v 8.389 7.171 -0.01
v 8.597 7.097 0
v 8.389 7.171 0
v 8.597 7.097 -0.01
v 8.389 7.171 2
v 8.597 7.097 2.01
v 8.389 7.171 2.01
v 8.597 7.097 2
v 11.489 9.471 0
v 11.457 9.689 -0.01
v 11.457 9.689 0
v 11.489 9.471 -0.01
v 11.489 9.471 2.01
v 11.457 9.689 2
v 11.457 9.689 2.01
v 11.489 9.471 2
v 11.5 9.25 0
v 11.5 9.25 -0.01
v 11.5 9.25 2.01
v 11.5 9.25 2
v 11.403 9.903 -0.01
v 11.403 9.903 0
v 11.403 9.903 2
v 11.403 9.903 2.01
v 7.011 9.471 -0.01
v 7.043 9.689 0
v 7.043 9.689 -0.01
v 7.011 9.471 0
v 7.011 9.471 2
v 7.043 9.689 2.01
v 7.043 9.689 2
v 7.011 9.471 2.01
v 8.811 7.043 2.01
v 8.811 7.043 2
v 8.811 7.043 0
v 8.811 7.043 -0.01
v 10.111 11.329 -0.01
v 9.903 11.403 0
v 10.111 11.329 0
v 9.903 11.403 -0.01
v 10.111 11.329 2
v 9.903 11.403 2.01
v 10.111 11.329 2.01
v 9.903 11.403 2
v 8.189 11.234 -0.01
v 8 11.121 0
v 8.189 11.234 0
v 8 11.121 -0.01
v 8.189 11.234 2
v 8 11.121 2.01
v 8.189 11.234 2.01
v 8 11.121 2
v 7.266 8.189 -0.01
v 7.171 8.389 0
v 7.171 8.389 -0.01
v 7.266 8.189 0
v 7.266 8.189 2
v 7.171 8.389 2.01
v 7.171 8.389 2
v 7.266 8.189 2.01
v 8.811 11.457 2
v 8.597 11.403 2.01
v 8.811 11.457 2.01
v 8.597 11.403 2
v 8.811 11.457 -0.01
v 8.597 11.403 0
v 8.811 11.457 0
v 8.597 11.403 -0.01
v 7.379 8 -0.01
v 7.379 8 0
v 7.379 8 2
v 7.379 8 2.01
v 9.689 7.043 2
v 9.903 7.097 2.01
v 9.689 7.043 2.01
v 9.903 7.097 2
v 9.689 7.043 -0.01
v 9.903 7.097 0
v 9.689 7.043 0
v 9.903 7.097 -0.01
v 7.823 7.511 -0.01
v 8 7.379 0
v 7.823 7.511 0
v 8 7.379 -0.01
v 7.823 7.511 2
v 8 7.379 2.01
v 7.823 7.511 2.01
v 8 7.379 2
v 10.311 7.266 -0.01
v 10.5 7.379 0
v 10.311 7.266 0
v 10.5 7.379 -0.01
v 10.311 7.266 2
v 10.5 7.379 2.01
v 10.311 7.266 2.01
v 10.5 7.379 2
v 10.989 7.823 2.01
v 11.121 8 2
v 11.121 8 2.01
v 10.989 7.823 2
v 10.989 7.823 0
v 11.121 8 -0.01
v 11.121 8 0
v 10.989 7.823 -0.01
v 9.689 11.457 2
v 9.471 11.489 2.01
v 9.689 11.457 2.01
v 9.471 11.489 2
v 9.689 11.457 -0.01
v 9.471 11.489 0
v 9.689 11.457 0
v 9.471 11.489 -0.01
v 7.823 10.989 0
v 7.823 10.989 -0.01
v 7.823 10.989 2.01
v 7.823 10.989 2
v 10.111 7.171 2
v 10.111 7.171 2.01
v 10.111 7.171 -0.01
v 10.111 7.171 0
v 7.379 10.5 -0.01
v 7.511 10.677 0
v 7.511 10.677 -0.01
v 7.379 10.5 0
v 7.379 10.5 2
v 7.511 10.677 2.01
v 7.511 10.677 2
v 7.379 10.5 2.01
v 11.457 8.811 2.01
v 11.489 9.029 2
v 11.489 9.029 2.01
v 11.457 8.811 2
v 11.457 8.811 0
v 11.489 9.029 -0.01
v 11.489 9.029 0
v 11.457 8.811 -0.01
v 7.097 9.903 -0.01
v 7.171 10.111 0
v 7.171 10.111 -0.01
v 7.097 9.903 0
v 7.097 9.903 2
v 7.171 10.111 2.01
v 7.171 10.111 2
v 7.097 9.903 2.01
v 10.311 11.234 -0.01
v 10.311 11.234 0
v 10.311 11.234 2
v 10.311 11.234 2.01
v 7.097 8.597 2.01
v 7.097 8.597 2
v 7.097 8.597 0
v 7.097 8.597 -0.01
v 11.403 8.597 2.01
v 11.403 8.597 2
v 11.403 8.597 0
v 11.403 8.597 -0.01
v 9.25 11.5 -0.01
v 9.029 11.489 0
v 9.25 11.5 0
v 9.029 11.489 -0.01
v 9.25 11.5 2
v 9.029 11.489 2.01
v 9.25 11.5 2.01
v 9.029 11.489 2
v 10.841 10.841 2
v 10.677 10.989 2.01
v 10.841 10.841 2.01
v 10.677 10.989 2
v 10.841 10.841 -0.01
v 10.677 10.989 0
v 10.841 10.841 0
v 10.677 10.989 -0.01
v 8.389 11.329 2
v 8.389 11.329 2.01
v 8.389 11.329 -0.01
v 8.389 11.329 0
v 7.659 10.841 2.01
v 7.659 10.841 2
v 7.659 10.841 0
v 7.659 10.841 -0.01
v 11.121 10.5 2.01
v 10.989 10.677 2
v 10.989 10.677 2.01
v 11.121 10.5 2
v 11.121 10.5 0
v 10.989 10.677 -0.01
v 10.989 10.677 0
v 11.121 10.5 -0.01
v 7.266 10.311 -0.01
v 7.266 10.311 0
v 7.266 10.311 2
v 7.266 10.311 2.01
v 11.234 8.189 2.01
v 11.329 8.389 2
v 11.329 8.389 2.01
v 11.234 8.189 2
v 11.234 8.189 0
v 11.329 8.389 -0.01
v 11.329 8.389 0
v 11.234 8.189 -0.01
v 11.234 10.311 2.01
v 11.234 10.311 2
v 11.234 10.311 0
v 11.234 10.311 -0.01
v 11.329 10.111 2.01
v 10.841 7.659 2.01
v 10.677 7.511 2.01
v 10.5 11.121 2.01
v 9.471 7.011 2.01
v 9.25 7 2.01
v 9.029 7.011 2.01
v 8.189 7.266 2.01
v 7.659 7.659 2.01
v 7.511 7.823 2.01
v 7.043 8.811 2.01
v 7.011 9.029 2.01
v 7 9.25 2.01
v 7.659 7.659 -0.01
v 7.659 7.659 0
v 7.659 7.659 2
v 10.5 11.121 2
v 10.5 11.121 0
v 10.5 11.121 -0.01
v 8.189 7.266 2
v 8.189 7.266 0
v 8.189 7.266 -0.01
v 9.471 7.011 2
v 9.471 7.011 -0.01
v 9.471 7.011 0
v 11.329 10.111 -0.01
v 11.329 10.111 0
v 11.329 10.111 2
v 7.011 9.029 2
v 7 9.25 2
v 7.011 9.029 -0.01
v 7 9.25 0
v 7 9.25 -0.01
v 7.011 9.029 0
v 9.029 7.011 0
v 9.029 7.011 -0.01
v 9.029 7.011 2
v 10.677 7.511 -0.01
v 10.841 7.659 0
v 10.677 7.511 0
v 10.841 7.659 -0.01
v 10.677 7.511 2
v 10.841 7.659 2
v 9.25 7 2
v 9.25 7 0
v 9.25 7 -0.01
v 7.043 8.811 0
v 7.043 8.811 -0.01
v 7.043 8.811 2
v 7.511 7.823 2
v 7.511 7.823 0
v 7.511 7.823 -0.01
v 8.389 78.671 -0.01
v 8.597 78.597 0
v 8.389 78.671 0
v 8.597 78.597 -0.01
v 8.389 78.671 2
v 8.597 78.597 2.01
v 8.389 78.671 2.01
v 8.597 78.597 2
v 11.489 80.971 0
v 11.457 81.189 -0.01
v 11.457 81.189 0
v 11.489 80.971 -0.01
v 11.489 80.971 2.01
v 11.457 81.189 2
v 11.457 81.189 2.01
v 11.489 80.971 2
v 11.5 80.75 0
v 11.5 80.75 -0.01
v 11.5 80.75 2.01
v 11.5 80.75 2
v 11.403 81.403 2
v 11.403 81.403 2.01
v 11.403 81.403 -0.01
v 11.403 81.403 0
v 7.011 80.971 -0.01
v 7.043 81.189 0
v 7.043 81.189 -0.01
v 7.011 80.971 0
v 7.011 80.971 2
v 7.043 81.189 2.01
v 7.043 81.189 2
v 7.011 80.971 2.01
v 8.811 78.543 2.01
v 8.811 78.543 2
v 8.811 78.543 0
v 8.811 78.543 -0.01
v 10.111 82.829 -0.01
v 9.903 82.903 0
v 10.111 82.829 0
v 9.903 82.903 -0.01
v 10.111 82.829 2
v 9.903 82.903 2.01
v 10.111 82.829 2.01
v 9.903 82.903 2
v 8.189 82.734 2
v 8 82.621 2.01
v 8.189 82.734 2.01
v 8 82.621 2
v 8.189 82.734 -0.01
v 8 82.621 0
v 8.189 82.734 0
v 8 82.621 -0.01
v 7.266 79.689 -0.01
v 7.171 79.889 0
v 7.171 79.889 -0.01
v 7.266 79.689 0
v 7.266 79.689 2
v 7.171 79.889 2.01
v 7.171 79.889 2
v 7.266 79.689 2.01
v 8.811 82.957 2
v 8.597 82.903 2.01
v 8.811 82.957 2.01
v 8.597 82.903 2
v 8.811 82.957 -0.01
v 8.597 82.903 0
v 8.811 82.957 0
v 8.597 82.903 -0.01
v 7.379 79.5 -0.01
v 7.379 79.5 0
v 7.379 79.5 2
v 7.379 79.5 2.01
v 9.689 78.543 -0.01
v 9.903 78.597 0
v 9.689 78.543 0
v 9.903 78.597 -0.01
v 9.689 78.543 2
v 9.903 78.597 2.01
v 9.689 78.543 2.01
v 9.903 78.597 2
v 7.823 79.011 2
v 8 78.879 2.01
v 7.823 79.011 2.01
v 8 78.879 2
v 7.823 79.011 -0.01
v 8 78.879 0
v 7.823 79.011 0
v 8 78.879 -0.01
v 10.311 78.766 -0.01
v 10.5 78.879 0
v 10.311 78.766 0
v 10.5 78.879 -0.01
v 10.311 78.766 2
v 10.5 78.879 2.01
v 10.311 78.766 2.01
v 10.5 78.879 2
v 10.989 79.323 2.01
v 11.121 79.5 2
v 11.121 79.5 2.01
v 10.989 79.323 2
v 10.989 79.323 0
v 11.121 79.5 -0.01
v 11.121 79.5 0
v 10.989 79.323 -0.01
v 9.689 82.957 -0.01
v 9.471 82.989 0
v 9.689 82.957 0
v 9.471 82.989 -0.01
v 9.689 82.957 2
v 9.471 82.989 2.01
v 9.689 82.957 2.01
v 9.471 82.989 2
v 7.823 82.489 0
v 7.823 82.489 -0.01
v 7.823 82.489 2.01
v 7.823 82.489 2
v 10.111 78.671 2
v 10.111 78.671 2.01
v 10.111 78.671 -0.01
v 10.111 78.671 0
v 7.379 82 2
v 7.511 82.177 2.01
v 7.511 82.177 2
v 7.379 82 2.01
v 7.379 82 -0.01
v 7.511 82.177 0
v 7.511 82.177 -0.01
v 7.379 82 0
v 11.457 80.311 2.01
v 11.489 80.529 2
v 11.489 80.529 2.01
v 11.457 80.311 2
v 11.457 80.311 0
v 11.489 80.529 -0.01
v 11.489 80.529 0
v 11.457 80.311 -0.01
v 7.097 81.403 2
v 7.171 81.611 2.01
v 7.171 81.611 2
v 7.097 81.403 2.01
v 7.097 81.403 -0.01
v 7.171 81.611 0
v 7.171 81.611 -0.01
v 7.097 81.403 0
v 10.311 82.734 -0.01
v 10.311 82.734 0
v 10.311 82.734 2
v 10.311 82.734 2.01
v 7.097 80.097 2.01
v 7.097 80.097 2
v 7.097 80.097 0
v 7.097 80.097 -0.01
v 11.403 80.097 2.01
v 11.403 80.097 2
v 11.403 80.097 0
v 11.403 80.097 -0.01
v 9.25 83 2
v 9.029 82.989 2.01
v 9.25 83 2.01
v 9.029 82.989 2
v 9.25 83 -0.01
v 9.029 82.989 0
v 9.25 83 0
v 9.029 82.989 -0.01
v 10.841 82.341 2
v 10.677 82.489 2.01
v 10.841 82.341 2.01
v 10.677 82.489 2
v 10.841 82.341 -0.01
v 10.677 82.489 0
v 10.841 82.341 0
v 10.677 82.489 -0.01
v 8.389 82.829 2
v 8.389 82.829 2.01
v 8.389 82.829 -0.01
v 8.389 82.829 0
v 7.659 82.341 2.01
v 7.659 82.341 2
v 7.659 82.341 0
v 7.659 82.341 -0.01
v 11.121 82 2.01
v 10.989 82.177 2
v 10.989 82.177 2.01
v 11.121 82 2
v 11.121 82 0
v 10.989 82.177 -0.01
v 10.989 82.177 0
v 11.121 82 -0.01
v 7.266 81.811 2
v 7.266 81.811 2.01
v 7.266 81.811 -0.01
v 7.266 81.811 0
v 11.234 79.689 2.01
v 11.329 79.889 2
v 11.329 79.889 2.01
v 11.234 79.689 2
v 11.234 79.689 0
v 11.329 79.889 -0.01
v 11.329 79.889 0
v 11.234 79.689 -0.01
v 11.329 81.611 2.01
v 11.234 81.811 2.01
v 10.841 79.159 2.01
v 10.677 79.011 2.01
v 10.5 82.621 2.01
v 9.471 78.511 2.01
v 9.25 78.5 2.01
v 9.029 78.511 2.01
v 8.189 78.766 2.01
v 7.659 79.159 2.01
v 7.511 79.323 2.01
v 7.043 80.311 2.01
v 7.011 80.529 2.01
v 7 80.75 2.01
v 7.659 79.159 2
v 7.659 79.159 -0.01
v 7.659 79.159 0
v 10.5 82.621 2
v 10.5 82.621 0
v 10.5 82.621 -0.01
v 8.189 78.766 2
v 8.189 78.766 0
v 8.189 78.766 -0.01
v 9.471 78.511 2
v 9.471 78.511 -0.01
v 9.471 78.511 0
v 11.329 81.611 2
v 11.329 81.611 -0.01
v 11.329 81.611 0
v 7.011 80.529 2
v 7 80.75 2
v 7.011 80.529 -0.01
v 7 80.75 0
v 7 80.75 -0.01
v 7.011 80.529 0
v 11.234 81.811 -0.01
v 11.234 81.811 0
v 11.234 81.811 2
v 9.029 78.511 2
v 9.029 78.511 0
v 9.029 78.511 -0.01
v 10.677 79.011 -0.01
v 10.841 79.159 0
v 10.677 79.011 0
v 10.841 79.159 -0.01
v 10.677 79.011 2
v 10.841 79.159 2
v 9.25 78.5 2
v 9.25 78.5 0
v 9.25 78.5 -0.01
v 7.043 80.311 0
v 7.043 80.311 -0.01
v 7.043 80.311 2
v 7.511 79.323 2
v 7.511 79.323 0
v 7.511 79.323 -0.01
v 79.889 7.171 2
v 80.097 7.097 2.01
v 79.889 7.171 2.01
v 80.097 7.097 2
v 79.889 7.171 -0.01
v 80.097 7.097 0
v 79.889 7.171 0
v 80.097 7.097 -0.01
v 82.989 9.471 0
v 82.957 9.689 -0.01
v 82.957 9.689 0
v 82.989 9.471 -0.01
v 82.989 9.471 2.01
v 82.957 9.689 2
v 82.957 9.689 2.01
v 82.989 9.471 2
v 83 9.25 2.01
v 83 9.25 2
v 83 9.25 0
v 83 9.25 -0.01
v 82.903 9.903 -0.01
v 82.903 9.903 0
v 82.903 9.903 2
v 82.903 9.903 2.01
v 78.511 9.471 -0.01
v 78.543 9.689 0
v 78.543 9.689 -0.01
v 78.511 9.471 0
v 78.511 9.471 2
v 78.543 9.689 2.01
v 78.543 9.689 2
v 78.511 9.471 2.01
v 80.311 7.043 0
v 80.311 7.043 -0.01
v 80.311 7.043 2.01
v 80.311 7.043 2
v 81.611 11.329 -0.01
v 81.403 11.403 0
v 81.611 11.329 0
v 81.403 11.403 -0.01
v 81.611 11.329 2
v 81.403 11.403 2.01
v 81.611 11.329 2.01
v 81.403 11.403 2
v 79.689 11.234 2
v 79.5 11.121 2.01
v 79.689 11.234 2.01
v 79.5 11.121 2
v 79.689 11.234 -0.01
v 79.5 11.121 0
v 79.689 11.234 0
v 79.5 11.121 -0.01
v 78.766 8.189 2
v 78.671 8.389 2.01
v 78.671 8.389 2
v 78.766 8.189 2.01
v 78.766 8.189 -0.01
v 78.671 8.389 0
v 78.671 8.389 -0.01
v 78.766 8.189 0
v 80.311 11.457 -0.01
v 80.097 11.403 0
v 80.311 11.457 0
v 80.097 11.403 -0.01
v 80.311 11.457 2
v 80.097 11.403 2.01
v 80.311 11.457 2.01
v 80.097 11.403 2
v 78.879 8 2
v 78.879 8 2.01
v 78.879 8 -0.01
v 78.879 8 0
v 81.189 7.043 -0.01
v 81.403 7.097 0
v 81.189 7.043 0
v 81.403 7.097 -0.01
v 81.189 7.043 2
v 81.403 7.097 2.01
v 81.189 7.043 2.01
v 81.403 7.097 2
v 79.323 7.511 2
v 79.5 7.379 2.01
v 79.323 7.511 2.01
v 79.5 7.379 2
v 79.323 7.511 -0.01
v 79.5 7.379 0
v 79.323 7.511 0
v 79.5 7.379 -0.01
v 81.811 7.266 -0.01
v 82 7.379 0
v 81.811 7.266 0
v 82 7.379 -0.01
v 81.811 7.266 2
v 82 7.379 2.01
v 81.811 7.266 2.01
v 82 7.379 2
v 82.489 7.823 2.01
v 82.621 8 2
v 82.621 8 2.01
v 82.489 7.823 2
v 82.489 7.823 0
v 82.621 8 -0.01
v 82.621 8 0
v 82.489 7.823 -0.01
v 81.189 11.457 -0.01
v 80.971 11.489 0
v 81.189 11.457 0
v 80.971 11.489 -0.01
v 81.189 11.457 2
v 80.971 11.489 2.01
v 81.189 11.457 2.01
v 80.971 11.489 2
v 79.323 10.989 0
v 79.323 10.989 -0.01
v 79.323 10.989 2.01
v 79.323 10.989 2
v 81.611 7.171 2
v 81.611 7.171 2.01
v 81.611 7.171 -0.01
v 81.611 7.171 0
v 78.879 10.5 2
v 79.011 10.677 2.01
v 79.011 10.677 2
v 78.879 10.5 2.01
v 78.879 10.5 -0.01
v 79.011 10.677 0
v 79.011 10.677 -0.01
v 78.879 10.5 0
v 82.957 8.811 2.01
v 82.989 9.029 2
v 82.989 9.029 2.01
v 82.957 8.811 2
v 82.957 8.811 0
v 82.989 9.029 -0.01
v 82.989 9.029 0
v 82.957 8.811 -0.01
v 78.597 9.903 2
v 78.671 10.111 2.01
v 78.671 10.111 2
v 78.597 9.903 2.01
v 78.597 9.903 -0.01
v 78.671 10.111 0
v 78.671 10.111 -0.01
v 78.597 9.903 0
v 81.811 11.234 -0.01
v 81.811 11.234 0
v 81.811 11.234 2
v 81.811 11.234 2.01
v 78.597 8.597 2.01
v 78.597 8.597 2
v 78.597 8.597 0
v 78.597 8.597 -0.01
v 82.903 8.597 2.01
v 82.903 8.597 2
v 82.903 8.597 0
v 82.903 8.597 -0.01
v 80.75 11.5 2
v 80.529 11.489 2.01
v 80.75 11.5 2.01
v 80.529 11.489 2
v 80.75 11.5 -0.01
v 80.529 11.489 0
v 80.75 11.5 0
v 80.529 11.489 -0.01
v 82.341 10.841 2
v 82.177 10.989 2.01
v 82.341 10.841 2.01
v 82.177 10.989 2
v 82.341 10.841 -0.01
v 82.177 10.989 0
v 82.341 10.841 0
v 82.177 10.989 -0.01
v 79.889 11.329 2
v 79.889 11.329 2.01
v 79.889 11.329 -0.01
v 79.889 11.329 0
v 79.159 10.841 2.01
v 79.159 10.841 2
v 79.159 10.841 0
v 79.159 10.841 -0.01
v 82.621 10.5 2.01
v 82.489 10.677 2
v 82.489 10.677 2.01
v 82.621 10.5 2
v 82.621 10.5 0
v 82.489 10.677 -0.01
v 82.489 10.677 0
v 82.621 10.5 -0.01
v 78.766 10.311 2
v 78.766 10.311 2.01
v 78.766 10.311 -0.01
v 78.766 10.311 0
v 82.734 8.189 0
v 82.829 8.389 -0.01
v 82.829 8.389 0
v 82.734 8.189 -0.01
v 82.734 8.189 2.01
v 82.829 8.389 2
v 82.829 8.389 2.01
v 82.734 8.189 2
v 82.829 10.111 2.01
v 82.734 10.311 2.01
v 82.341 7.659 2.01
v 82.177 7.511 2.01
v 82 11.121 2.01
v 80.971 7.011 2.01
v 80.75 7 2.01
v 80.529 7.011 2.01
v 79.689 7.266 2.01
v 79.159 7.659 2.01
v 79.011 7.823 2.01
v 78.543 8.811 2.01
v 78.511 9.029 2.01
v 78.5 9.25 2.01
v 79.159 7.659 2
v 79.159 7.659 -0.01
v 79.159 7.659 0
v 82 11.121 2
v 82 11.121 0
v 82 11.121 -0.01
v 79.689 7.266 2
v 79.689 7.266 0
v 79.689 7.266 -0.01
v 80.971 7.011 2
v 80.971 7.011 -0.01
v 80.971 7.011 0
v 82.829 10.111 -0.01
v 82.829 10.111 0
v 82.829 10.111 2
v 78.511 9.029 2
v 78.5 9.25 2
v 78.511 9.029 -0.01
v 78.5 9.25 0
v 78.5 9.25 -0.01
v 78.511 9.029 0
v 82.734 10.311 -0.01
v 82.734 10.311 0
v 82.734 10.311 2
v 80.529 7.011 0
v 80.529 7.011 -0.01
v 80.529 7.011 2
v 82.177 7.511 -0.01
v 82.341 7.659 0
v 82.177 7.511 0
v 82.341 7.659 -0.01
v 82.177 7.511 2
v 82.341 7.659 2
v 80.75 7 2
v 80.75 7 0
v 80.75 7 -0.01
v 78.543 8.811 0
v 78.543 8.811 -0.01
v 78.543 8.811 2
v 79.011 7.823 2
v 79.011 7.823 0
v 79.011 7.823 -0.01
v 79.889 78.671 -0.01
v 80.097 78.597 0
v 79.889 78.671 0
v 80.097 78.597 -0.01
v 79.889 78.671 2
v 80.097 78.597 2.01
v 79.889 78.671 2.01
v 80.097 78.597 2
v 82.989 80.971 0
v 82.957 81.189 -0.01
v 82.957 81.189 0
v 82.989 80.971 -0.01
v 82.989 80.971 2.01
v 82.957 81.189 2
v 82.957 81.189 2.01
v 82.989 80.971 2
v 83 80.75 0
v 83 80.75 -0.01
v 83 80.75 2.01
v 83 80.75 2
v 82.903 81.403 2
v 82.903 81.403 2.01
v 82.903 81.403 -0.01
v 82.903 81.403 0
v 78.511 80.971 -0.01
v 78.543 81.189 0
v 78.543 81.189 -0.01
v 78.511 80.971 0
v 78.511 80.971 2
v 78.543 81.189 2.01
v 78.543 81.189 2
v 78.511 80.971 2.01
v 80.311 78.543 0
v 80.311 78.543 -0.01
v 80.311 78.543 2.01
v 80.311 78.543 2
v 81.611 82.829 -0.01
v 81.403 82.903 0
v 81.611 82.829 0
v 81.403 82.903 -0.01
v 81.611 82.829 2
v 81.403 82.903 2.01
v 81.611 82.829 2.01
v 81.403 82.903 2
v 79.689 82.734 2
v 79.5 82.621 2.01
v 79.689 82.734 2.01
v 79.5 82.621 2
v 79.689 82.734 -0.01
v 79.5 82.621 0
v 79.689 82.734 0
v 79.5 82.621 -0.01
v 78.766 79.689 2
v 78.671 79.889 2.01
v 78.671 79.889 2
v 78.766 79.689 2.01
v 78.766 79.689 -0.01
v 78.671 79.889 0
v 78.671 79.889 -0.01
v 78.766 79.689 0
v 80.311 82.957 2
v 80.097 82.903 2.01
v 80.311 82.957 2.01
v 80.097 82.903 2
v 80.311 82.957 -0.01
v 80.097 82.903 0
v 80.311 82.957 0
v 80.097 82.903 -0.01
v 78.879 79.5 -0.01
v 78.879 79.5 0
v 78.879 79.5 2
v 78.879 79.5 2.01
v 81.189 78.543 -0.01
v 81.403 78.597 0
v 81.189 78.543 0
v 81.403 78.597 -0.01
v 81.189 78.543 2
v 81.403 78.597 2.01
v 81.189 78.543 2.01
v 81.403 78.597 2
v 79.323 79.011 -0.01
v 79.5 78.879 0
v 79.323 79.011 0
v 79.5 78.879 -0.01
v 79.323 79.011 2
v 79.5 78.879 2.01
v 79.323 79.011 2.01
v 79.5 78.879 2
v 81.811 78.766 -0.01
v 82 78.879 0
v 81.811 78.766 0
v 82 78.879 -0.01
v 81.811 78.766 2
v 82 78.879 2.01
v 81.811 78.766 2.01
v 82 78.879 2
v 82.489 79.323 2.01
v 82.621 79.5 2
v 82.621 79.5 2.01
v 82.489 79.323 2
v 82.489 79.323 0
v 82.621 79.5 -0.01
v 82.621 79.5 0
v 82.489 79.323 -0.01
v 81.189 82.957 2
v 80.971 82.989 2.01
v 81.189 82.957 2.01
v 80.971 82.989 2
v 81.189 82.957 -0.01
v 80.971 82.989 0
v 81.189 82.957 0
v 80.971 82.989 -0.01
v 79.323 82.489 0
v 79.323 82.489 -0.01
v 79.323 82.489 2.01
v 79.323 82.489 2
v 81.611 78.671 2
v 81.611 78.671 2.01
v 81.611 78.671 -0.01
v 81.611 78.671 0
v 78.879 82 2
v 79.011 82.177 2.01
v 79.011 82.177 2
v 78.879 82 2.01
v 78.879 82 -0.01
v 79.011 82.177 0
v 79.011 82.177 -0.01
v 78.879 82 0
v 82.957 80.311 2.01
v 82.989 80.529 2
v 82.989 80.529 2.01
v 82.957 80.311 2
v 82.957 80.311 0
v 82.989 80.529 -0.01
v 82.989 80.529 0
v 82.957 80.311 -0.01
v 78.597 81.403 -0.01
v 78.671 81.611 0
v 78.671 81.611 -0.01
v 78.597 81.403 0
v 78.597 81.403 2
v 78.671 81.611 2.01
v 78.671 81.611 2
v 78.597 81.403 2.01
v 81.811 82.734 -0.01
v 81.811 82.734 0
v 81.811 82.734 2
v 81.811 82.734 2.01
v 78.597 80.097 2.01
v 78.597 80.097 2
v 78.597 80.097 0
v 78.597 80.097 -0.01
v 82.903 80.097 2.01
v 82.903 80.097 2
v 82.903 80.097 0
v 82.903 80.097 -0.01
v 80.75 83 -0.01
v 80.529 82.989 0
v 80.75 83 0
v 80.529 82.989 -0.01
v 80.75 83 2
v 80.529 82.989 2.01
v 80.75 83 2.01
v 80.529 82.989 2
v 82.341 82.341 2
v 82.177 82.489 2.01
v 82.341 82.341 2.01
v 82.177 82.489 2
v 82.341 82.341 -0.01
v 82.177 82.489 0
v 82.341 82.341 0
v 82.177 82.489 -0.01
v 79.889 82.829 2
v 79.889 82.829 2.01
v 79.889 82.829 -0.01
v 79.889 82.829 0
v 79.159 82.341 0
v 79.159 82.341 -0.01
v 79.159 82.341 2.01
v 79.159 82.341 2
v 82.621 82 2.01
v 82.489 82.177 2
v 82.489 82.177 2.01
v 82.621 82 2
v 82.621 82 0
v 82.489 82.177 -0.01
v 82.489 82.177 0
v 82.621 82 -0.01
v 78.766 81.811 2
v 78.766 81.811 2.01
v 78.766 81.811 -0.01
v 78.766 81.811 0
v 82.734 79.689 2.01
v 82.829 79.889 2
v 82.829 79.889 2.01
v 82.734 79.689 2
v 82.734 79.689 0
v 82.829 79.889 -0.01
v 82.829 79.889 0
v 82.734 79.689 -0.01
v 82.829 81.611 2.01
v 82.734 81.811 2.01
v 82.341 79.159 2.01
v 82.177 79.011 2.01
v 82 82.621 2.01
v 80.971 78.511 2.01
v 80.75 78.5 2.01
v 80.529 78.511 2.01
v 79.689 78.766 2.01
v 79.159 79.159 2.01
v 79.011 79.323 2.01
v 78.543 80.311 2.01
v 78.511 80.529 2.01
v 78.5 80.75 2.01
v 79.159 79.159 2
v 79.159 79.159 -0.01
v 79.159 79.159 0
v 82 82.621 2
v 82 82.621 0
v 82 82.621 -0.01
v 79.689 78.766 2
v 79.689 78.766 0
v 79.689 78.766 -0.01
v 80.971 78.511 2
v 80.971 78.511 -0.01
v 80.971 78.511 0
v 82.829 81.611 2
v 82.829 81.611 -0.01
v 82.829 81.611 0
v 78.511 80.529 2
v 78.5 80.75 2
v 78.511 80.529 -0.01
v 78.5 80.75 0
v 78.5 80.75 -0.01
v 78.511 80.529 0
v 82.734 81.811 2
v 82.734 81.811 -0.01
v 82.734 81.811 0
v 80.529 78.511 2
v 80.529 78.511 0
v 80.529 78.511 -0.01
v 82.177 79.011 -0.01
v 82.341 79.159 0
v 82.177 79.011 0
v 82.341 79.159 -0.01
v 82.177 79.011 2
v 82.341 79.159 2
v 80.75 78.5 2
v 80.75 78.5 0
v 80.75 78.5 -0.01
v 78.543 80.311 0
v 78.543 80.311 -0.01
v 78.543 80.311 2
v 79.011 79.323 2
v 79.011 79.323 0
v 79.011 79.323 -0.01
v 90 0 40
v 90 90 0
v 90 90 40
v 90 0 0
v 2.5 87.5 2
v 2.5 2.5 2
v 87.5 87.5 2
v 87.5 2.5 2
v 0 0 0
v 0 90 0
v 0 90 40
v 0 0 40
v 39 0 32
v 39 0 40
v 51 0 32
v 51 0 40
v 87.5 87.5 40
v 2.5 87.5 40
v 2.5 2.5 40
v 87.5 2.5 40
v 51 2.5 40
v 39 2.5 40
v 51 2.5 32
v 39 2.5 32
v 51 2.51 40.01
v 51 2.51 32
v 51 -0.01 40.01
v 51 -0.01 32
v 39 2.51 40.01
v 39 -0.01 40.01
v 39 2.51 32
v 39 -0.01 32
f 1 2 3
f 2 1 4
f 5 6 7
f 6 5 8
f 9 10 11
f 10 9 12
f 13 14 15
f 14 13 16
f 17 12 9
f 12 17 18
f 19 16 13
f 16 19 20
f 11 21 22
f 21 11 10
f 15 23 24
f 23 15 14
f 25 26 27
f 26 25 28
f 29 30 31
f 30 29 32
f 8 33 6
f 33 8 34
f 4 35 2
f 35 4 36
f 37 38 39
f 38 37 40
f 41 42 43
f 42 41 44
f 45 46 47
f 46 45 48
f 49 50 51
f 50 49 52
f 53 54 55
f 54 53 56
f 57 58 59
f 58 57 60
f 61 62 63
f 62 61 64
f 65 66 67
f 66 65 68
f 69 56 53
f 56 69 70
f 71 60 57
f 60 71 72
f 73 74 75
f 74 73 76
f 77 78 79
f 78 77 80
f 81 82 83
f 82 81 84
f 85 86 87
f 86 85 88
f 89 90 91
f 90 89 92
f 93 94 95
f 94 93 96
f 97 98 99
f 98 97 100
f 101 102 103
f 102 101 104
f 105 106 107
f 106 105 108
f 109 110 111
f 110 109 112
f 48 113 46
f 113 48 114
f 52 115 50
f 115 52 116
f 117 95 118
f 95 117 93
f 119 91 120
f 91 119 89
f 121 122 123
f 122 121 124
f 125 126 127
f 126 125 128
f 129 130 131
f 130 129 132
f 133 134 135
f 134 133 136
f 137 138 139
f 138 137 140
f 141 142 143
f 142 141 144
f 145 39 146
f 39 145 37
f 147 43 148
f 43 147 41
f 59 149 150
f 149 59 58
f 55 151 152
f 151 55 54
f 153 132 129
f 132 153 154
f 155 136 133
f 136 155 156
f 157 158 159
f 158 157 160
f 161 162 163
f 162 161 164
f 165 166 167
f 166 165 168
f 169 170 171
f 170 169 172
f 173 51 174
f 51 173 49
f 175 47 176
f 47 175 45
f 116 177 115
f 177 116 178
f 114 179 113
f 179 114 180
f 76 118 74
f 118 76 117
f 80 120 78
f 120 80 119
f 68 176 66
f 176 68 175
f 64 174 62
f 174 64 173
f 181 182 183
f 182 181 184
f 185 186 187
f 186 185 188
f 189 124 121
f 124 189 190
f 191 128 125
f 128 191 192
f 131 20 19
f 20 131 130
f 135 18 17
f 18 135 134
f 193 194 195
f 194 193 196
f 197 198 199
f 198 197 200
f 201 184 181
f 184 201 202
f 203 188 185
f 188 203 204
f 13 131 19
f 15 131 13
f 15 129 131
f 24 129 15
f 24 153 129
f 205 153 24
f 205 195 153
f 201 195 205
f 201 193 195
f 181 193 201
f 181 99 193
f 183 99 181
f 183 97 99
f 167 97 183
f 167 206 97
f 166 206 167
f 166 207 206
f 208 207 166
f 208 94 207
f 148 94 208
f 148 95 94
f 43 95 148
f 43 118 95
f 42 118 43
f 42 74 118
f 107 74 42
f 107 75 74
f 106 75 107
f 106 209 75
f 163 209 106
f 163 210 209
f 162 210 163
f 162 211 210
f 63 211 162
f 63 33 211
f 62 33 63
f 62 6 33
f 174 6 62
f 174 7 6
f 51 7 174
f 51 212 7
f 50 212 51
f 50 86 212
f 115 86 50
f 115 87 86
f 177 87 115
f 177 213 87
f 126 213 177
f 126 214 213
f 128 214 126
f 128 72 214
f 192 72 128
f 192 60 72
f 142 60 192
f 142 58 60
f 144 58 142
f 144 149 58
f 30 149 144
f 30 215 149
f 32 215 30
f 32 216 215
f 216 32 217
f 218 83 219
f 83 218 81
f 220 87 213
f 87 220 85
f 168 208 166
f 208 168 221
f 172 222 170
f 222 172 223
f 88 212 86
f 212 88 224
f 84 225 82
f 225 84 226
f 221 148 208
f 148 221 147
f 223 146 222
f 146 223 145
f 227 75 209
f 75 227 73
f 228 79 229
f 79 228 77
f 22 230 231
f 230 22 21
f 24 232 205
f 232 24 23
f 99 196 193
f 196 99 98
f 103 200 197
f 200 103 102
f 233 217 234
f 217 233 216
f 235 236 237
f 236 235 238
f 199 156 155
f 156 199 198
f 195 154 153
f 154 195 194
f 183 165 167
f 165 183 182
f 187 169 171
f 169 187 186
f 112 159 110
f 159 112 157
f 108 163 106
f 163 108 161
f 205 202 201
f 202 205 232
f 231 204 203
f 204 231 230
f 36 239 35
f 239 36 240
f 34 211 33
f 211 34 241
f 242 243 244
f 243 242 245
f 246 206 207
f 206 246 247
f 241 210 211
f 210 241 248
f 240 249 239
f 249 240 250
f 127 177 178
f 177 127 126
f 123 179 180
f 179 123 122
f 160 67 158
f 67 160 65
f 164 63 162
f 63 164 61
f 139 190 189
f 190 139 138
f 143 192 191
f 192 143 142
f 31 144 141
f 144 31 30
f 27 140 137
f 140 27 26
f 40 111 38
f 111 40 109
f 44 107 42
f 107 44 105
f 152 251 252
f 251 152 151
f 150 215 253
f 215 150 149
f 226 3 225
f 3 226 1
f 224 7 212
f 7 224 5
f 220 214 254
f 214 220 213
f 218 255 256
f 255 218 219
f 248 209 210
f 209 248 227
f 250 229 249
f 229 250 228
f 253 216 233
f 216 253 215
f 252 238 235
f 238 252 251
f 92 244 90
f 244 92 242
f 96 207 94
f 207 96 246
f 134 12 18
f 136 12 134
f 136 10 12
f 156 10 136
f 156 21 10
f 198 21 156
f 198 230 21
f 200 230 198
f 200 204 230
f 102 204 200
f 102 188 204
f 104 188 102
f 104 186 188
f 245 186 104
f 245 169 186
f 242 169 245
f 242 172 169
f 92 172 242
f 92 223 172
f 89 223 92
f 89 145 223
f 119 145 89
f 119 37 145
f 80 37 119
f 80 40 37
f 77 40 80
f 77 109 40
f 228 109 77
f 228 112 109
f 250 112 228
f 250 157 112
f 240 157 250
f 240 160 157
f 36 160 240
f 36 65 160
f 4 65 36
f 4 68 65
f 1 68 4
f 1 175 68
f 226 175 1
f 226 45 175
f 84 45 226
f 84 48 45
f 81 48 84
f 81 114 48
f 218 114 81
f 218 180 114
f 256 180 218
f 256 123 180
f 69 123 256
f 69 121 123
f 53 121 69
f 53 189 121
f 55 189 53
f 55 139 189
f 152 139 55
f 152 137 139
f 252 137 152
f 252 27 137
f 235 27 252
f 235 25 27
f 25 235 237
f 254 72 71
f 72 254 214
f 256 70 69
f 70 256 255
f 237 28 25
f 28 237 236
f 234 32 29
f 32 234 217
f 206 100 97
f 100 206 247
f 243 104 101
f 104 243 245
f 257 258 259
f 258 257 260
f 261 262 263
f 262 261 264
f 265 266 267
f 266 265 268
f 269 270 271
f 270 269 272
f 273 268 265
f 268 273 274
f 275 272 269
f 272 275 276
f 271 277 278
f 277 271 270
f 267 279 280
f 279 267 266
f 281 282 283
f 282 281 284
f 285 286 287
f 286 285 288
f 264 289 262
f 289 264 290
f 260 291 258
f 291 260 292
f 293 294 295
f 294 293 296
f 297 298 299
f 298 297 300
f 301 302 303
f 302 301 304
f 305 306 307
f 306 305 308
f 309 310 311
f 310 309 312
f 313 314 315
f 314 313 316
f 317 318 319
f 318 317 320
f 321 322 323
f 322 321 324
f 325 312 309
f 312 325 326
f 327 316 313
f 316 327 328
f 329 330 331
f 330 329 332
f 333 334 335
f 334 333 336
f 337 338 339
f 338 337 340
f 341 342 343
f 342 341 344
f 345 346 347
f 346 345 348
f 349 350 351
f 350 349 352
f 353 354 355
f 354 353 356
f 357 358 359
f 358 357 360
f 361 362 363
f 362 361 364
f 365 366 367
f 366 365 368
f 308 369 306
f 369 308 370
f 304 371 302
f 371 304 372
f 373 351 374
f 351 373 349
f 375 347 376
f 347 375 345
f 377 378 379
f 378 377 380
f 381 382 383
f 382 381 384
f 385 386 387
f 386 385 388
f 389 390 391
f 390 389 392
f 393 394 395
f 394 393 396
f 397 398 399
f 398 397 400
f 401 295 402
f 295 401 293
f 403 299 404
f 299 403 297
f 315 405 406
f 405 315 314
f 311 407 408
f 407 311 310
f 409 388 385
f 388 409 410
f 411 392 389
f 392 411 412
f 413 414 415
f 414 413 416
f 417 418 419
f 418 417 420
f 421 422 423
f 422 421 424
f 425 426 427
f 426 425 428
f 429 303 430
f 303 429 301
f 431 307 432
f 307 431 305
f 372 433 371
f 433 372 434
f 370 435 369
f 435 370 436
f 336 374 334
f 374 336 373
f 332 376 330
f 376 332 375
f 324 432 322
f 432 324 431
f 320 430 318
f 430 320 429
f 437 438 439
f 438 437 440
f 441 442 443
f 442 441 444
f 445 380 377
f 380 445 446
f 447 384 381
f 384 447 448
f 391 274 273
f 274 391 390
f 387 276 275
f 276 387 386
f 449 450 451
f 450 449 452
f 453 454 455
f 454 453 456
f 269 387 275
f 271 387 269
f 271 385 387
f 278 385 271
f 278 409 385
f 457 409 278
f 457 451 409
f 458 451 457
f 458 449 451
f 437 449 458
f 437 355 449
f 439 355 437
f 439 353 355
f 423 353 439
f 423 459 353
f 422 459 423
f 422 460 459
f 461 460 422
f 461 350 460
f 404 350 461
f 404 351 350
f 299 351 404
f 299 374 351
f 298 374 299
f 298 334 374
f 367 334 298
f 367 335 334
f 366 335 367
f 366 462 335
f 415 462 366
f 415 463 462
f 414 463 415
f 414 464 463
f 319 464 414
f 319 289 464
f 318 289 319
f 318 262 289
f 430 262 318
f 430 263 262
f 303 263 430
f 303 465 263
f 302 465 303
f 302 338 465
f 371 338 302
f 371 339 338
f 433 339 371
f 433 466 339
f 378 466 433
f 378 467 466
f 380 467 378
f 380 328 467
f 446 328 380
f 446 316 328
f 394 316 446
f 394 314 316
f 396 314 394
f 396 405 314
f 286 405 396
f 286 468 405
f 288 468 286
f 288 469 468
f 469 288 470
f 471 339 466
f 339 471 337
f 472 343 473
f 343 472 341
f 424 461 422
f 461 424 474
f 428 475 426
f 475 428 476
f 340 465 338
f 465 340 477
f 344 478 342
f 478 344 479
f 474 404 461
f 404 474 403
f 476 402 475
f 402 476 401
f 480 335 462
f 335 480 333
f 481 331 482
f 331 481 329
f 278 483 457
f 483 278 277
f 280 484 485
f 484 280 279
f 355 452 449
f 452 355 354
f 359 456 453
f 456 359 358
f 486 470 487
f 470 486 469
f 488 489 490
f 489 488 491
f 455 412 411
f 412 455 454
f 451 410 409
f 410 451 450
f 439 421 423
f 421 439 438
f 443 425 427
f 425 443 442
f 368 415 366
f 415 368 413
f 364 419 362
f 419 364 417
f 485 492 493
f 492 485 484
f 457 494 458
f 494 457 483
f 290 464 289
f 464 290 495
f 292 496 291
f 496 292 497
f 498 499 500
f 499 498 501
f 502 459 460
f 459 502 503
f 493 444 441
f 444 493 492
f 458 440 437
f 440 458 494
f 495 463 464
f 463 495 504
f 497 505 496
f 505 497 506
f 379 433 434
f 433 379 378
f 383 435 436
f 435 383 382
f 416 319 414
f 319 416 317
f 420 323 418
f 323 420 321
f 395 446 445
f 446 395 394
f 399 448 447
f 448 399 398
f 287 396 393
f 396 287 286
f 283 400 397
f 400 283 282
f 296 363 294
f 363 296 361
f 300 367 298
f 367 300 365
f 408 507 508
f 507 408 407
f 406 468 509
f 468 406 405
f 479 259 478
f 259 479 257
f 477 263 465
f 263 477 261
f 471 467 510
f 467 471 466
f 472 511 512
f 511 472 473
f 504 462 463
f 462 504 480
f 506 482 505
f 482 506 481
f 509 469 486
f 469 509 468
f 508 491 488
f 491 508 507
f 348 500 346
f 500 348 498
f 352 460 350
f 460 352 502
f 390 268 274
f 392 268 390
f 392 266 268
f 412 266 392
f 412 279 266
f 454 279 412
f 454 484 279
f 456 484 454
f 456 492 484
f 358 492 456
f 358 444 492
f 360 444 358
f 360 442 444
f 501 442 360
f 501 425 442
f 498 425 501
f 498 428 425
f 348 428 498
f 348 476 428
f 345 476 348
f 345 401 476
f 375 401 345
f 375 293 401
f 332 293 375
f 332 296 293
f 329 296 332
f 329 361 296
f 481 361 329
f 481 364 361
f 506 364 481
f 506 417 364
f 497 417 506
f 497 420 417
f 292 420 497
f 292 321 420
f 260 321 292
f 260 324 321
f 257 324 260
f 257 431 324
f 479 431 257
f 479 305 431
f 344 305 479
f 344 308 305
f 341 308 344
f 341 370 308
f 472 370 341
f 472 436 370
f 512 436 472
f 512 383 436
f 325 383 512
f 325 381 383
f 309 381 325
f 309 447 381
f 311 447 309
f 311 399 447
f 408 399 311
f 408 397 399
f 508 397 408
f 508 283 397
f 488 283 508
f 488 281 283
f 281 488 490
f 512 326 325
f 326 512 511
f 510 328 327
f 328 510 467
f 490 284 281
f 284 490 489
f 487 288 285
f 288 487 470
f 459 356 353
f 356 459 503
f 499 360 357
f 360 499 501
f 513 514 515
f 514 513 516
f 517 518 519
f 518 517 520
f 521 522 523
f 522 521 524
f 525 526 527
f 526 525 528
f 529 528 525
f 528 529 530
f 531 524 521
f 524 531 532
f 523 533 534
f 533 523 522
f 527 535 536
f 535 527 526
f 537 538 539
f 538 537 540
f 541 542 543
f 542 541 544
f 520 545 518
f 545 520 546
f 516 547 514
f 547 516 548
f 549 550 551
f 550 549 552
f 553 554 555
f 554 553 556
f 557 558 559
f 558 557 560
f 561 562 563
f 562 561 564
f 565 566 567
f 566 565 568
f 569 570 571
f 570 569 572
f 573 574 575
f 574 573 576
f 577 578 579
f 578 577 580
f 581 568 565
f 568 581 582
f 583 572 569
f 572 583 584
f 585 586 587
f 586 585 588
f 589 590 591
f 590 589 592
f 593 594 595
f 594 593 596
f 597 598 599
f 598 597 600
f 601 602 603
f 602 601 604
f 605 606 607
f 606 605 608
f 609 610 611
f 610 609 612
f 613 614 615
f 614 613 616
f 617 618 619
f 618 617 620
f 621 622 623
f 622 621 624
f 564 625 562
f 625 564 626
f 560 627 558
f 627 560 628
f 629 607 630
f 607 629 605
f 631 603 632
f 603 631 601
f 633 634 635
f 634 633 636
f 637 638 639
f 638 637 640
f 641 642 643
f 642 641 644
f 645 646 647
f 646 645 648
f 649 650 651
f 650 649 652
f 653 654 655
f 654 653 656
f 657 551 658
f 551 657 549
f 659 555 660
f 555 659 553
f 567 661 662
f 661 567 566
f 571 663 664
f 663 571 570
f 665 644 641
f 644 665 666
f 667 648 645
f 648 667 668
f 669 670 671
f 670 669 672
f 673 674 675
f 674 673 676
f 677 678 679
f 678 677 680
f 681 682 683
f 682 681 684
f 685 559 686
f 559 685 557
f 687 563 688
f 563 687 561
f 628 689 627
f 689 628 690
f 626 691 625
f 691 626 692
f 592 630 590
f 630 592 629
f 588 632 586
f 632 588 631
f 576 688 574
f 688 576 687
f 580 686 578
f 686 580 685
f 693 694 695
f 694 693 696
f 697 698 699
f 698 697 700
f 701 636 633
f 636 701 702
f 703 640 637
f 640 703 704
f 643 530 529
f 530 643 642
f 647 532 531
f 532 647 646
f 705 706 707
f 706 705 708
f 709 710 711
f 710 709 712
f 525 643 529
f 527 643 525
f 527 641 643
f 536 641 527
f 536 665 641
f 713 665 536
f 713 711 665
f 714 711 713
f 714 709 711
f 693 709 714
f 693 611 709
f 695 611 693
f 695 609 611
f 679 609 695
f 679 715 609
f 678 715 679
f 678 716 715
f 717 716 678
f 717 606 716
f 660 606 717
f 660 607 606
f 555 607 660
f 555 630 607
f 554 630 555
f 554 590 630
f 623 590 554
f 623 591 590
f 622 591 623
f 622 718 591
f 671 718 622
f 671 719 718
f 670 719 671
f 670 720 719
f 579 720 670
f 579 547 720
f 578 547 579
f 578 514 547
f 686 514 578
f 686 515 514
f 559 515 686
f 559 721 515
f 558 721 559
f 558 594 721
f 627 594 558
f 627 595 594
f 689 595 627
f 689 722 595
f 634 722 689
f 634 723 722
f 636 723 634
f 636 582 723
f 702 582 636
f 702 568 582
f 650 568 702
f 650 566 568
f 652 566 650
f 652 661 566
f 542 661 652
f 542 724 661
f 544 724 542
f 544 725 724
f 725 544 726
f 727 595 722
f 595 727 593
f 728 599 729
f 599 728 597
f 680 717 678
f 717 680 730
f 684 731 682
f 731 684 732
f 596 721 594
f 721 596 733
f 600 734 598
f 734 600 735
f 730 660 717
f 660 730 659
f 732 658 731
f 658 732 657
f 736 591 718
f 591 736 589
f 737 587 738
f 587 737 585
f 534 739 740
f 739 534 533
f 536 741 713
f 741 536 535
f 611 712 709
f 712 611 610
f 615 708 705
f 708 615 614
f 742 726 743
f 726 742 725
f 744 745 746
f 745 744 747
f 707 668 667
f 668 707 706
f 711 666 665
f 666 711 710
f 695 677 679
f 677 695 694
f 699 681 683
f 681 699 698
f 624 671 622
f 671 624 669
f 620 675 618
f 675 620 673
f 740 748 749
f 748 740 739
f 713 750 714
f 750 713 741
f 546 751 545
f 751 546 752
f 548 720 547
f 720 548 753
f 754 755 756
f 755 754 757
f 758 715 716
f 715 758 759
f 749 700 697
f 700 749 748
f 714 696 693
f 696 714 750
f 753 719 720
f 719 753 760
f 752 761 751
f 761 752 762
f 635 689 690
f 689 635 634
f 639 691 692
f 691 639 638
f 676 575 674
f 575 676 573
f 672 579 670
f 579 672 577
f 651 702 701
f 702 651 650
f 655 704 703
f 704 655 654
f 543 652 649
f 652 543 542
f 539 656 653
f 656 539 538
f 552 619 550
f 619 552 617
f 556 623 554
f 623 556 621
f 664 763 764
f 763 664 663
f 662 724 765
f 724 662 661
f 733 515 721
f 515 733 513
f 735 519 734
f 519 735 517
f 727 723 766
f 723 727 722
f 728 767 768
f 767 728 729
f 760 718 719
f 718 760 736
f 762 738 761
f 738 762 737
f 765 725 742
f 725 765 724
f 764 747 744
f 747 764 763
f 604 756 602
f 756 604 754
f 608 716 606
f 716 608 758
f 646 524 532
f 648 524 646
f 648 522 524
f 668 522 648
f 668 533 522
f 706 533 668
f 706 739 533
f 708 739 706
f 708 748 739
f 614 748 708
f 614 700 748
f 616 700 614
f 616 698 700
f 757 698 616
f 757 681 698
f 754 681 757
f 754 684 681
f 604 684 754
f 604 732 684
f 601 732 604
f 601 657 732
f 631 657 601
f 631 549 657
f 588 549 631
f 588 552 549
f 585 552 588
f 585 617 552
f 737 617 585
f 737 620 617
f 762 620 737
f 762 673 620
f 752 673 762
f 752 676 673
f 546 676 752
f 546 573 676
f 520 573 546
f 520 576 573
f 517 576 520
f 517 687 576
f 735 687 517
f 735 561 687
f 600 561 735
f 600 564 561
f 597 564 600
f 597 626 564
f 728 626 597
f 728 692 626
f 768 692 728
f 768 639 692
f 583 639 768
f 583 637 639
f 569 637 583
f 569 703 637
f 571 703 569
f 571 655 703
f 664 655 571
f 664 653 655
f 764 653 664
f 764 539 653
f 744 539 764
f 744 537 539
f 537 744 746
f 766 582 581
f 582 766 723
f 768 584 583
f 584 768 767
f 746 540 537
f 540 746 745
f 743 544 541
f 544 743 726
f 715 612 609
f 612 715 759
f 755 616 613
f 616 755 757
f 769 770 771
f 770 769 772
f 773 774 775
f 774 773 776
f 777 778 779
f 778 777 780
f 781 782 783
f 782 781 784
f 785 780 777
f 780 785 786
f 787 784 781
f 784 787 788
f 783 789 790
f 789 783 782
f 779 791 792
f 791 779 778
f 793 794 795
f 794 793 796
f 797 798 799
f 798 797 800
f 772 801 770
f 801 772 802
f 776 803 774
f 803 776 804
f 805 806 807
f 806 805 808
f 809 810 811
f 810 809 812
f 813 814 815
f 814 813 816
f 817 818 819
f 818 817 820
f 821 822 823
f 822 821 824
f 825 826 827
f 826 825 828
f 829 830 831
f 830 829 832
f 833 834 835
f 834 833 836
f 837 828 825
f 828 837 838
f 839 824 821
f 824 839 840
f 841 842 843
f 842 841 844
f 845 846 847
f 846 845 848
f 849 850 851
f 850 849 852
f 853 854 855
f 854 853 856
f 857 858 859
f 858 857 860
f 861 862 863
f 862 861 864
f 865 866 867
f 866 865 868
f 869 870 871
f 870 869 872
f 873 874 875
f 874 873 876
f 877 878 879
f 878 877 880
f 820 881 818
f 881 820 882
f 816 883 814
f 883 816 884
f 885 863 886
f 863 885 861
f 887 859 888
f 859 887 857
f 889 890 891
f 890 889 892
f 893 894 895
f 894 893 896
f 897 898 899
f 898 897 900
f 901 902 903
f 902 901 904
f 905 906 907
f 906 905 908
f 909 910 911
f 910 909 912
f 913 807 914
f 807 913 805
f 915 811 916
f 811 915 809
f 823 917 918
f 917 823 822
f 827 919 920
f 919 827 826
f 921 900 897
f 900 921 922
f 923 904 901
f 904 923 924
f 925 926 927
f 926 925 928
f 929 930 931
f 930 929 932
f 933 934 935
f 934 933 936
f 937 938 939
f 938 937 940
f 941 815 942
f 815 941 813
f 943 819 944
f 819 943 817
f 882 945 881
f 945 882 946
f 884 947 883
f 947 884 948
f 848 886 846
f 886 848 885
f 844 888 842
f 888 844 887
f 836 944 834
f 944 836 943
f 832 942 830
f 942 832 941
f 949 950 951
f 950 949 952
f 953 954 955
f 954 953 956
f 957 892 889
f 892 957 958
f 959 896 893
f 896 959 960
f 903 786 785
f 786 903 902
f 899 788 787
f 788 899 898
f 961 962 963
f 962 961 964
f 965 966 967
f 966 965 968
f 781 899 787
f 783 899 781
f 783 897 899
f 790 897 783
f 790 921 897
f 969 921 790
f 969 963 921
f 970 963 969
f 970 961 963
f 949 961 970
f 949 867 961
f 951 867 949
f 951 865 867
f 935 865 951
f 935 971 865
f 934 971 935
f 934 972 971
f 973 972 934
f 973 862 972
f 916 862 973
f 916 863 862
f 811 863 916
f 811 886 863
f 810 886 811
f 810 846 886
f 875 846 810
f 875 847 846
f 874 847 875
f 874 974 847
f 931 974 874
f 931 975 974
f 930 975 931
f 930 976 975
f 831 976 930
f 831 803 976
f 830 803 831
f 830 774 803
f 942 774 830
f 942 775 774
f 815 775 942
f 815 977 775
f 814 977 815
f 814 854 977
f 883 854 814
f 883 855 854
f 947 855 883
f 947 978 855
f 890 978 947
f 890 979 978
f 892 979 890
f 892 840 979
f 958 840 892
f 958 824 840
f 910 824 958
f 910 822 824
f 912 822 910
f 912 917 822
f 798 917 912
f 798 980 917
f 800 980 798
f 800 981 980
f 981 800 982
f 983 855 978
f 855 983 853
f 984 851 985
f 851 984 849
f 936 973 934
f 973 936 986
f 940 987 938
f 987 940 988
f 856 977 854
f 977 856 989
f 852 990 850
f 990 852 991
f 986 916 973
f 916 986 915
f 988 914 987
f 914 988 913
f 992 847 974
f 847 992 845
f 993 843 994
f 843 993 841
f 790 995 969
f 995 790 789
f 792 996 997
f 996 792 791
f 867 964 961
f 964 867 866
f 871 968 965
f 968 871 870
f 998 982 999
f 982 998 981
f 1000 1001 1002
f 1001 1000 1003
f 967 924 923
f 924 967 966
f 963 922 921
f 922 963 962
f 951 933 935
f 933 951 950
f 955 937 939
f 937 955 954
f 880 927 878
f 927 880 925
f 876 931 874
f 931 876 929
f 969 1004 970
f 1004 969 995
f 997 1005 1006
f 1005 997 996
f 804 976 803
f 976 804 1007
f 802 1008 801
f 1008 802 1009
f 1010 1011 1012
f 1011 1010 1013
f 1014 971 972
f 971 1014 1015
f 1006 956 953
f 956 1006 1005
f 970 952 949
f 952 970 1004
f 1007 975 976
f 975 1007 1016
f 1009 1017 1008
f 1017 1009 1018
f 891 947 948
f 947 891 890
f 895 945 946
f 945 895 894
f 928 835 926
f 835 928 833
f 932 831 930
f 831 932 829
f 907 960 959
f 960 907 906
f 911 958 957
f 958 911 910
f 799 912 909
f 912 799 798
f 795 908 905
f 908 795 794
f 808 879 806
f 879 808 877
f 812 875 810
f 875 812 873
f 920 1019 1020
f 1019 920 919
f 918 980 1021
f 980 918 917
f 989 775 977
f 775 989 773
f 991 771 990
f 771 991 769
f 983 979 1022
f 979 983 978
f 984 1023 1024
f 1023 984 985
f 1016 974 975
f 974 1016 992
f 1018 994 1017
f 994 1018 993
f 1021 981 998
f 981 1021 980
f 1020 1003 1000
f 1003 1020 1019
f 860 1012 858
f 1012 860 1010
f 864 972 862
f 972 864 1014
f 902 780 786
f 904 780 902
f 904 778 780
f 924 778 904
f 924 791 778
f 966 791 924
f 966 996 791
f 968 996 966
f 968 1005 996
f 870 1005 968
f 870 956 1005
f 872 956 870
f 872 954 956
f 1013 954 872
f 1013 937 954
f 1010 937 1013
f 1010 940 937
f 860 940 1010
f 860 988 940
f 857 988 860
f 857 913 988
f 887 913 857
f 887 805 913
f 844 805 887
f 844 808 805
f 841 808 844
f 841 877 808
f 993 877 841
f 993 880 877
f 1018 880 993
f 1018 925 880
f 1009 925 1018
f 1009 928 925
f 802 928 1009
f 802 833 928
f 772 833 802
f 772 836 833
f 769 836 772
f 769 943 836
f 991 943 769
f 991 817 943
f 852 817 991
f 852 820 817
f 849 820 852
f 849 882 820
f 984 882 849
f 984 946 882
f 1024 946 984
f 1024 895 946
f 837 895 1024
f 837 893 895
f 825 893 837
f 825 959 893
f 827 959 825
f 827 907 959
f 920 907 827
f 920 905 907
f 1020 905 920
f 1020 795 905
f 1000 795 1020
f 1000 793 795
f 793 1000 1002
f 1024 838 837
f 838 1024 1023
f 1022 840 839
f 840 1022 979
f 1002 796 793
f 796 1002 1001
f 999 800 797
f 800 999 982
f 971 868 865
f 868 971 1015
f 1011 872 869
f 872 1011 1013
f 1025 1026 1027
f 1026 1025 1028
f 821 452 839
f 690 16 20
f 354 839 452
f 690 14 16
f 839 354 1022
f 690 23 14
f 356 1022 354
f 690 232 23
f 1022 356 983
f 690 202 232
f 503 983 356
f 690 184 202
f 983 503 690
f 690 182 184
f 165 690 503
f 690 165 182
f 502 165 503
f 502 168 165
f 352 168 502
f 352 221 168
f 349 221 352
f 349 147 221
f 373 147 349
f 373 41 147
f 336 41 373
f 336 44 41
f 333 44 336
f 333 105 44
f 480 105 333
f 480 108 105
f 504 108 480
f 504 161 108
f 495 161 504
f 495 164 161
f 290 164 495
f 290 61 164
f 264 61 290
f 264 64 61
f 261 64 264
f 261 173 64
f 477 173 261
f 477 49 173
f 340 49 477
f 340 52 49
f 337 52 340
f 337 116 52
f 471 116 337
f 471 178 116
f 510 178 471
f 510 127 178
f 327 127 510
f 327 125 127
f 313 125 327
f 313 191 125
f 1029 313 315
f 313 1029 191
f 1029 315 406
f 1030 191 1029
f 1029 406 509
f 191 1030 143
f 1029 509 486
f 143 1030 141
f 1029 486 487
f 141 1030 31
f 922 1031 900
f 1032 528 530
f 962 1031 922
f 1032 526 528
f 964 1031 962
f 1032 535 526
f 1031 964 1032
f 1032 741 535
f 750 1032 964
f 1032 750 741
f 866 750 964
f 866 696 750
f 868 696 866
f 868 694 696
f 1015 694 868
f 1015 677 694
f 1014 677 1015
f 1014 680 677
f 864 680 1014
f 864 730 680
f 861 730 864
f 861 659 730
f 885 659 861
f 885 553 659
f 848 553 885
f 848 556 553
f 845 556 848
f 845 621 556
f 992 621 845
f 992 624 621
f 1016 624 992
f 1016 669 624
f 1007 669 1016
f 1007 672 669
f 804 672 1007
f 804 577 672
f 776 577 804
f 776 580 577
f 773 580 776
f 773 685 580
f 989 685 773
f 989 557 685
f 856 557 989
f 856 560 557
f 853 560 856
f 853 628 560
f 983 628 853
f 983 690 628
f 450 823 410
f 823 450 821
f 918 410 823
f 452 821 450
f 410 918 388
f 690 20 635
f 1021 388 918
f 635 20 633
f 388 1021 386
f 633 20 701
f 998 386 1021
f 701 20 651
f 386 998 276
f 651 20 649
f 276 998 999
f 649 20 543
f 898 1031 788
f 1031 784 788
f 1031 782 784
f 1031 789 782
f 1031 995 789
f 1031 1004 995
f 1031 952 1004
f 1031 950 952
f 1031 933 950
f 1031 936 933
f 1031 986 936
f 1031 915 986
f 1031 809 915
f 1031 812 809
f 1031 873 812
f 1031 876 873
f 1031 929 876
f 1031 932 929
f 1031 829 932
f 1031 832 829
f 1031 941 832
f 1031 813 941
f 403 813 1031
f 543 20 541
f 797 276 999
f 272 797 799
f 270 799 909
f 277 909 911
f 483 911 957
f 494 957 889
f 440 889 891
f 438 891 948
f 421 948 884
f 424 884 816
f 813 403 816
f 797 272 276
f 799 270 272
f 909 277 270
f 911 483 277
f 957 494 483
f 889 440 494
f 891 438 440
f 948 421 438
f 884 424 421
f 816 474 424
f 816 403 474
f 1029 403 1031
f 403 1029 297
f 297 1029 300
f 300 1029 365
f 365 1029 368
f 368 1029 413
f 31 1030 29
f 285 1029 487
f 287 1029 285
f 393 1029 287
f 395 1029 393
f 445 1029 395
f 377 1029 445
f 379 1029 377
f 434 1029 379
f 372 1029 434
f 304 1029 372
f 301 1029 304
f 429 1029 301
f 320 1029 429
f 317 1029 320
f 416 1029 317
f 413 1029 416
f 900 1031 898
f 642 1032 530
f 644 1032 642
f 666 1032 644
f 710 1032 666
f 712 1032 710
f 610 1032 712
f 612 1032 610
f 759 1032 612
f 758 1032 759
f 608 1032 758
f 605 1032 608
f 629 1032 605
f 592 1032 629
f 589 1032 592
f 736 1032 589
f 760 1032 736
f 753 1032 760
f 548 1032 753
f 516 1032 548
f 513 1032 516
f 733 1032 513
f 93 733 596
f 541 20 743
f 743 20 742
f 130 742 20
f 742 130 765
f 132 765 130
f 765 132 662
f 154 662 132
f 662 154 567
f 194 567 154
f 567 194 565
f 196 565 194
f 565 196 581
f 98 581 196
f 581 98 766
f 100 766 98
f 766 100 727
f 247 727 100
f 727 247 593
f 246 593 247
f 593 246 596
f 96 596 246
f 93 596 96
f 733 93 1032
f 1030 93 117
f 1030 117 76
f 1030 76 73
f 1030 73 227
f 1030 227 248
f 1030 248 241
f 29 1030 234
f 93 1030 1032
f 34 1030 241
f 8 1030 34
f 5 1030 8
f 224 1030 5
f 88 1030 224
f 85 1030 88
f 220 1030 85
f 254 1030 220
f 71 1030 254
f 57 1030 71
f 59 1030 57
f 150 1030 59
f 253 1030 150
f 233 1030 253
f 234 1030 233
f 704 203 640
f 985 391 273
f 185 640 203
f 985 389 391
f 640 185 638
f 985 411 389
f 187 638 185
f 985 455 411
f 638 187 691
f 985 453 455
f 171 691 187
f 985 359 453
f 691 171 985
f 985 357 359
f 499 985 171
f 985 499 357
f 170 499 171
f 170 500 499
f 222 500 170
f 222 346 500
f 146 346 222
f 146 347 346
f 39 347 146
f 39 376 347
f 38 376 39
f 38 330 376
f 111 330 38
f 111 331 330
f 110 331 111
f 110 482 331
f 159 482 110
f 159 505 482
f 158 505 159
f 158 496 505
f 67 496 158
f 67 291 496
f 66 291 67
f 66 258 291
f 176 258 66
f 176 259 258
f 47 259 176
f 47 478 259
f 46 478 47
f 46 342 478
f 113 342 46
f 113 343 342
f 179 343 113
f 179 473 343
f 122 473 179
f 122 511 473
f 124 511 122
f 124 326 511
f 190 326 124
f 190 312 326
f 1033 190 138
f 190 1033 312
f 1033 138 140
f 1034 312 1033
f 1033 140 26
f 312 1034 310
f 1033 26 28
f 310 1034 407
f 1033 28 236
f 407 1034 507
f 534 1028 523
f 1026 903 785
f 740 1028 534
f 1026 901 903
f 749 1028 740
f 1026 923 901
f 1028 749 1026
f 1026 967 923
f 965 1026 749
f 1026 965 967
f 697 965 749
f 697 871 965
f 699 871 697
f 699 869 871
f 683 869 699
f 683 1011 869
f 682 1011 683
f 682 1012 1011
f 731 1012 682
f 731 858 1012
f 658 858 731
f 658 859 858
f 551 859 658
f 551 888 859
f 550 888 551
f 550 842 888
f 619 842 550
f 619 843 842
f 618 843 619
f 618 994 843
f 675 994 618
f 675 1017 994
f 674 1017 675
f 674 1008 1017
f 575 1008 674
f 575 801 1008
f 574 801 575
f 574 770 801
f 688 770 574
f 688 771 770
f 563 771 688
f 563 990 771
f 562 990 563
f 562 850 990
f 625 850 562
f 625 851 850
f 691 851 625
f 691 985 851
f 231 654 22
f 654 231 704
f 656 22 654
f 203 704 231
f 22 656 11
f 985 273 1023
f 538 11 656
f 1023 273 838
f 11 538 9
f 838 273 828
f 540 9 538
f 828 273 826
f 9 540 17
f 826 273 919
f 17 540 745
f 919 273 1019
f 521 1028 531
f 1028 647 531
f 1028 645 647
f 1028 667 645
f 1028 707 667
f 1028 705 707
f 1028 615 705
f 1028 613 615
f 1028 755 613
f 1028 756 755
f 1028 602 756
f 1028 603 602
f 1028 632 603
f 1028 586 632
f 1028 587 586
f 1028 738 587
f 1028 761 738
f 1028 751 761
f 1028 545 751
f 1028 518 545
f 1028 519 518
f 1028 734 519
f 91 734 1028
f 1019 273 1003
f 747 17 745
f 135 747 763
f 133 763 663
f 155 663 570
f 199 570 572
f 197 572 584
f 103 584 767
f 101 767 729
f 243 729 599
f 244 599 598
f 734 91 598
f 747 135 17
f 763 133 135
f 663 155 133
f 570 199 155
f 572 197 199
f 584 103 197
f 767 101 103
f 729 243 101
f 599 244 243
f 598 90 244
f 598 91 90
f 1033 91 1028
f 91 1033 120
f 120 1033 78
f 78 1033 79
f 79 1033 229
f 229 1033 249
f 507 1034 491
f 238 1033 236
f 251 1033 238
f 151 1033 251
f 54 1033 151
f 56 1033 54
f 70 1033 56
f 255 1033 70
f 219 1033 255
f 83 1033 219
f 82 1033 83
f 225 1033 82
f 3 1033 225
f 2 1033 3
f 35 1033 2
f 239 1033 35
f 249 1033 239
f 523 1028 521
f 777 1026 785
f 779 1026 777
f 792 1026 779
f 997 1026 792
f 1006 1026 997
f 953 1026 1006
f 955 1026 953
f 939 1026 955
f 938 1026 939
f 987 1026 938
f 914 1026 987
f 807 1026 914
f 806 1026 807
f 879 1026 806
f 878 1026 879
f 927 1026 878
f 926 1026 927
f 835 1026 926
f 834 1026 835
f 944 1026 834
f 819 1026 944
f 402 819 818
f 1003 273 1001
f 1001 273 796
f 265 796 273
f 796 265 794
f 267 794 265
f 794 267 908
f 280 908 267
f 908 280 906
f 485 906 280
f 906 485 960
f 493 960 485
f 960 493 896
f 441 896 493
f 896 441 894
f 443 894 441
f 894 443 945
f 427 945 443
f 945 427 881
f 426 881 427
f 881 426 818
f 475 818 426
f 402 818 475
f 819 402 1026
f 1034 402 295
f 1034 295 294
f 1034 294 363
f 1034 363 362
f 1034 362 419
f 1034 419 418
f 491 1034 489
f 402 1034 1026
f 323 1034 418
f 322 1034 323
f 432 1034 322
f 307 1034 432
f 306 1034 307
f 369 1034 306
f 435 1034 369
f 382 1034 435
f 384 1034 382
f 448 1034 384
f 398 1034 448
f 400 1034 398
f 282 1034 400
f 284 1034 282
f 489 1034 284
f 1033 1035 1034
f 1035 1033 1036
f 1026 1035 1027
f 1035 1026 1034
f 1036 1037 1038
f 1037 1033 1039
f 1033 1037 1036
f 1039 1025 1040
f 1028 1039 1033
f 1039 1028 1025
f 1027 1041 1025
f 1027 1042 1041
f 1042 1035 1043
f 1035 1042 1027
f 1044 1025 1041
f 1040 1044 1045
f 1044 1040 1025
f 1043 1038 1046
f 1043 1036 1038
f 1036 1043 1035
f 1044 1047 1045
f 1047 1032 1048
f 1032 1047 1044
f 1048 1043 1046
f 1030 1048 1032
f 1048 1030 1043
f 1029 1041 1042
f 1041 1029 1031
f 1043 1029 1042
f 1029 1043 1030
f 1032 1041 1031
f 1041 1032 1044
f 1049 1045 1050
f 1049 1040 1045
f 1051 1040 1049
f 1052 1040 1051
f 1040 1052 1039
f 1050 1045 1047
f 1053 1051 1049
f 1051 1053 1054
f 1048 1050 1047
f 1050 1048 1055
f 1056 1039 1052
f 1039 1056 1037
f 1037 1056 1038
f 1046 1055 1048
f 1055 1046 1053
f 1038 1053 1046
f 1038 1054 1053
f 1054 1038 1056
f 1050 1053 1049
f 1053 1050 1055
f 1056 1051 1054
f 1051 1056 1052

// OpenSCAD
// Dimensions (mm) - measured with calipers
top_plate_thickness = 2;
wall_thickness = 2.5;
wall_height = 40;
outer_size = 90;
screw_hole_dia = 4.5;
screw_pattern_size = 71.5;
notch_width = 12;
notch_depth = 8;

$fn = 64;

// Top plate (rests on bed, z = 0 to 2)
cube([outer_size, outer_size, top_plate_thickness], center = false);

// Four walls rising from top plate to z = 40
// Front wall (Y = 0 side)
translate([0, 0, top_plate_thickness])
  cube([outer_size, wall_thickness, wall_height - top_plate_thickness]);

// Back wall (Y = outer_size - wall_thickness side)
translate([0, outer_size - wall_thickness, top_plate_thickness])
  cube([outer_size, wall_thickness, wall_height - top_plate_thickness]);

// Left wall (X = 0 side)
translate([0, wall_thickness, top_plate_thickness])
  cube([wall_thickness, outer_size - 2 * wall_thickness, wall_height - top_plate_thickness]);

// Right wall (X = outer_size - wall_thickness side)
translate([outer_size - wall_thickness, wall_thickness, top_plate_thickness])
  cube([wall_thickness, outer_size - 2 * wall_thickness, wall_height - top_plate_thickness]);

// Cut screw holes through top plate
for (x = [-1, 1]) {
  for (y = [-1, 1]) {
    translate([outer_size / 2 + x * screw_pattern_size / 2,
               outer_size / 2 + y * screw_pattern_size / 2,
               -0.01])
      cylinder(h = top_plate_thickness + 0.02, r = screw_hole_dia / 2, center = false);
  }
}

// Cut cable notch in one wall (front wall, Y = 0 side)
// Notch is 12 mm wide, centred along the wall, from z = 32 to z = 40
translate([outer_size / 2 - notch_width / 2, -0.01, 32])
  cube([notch_width, wall_thickness + 0.02, notch_depth + 0.01]);
